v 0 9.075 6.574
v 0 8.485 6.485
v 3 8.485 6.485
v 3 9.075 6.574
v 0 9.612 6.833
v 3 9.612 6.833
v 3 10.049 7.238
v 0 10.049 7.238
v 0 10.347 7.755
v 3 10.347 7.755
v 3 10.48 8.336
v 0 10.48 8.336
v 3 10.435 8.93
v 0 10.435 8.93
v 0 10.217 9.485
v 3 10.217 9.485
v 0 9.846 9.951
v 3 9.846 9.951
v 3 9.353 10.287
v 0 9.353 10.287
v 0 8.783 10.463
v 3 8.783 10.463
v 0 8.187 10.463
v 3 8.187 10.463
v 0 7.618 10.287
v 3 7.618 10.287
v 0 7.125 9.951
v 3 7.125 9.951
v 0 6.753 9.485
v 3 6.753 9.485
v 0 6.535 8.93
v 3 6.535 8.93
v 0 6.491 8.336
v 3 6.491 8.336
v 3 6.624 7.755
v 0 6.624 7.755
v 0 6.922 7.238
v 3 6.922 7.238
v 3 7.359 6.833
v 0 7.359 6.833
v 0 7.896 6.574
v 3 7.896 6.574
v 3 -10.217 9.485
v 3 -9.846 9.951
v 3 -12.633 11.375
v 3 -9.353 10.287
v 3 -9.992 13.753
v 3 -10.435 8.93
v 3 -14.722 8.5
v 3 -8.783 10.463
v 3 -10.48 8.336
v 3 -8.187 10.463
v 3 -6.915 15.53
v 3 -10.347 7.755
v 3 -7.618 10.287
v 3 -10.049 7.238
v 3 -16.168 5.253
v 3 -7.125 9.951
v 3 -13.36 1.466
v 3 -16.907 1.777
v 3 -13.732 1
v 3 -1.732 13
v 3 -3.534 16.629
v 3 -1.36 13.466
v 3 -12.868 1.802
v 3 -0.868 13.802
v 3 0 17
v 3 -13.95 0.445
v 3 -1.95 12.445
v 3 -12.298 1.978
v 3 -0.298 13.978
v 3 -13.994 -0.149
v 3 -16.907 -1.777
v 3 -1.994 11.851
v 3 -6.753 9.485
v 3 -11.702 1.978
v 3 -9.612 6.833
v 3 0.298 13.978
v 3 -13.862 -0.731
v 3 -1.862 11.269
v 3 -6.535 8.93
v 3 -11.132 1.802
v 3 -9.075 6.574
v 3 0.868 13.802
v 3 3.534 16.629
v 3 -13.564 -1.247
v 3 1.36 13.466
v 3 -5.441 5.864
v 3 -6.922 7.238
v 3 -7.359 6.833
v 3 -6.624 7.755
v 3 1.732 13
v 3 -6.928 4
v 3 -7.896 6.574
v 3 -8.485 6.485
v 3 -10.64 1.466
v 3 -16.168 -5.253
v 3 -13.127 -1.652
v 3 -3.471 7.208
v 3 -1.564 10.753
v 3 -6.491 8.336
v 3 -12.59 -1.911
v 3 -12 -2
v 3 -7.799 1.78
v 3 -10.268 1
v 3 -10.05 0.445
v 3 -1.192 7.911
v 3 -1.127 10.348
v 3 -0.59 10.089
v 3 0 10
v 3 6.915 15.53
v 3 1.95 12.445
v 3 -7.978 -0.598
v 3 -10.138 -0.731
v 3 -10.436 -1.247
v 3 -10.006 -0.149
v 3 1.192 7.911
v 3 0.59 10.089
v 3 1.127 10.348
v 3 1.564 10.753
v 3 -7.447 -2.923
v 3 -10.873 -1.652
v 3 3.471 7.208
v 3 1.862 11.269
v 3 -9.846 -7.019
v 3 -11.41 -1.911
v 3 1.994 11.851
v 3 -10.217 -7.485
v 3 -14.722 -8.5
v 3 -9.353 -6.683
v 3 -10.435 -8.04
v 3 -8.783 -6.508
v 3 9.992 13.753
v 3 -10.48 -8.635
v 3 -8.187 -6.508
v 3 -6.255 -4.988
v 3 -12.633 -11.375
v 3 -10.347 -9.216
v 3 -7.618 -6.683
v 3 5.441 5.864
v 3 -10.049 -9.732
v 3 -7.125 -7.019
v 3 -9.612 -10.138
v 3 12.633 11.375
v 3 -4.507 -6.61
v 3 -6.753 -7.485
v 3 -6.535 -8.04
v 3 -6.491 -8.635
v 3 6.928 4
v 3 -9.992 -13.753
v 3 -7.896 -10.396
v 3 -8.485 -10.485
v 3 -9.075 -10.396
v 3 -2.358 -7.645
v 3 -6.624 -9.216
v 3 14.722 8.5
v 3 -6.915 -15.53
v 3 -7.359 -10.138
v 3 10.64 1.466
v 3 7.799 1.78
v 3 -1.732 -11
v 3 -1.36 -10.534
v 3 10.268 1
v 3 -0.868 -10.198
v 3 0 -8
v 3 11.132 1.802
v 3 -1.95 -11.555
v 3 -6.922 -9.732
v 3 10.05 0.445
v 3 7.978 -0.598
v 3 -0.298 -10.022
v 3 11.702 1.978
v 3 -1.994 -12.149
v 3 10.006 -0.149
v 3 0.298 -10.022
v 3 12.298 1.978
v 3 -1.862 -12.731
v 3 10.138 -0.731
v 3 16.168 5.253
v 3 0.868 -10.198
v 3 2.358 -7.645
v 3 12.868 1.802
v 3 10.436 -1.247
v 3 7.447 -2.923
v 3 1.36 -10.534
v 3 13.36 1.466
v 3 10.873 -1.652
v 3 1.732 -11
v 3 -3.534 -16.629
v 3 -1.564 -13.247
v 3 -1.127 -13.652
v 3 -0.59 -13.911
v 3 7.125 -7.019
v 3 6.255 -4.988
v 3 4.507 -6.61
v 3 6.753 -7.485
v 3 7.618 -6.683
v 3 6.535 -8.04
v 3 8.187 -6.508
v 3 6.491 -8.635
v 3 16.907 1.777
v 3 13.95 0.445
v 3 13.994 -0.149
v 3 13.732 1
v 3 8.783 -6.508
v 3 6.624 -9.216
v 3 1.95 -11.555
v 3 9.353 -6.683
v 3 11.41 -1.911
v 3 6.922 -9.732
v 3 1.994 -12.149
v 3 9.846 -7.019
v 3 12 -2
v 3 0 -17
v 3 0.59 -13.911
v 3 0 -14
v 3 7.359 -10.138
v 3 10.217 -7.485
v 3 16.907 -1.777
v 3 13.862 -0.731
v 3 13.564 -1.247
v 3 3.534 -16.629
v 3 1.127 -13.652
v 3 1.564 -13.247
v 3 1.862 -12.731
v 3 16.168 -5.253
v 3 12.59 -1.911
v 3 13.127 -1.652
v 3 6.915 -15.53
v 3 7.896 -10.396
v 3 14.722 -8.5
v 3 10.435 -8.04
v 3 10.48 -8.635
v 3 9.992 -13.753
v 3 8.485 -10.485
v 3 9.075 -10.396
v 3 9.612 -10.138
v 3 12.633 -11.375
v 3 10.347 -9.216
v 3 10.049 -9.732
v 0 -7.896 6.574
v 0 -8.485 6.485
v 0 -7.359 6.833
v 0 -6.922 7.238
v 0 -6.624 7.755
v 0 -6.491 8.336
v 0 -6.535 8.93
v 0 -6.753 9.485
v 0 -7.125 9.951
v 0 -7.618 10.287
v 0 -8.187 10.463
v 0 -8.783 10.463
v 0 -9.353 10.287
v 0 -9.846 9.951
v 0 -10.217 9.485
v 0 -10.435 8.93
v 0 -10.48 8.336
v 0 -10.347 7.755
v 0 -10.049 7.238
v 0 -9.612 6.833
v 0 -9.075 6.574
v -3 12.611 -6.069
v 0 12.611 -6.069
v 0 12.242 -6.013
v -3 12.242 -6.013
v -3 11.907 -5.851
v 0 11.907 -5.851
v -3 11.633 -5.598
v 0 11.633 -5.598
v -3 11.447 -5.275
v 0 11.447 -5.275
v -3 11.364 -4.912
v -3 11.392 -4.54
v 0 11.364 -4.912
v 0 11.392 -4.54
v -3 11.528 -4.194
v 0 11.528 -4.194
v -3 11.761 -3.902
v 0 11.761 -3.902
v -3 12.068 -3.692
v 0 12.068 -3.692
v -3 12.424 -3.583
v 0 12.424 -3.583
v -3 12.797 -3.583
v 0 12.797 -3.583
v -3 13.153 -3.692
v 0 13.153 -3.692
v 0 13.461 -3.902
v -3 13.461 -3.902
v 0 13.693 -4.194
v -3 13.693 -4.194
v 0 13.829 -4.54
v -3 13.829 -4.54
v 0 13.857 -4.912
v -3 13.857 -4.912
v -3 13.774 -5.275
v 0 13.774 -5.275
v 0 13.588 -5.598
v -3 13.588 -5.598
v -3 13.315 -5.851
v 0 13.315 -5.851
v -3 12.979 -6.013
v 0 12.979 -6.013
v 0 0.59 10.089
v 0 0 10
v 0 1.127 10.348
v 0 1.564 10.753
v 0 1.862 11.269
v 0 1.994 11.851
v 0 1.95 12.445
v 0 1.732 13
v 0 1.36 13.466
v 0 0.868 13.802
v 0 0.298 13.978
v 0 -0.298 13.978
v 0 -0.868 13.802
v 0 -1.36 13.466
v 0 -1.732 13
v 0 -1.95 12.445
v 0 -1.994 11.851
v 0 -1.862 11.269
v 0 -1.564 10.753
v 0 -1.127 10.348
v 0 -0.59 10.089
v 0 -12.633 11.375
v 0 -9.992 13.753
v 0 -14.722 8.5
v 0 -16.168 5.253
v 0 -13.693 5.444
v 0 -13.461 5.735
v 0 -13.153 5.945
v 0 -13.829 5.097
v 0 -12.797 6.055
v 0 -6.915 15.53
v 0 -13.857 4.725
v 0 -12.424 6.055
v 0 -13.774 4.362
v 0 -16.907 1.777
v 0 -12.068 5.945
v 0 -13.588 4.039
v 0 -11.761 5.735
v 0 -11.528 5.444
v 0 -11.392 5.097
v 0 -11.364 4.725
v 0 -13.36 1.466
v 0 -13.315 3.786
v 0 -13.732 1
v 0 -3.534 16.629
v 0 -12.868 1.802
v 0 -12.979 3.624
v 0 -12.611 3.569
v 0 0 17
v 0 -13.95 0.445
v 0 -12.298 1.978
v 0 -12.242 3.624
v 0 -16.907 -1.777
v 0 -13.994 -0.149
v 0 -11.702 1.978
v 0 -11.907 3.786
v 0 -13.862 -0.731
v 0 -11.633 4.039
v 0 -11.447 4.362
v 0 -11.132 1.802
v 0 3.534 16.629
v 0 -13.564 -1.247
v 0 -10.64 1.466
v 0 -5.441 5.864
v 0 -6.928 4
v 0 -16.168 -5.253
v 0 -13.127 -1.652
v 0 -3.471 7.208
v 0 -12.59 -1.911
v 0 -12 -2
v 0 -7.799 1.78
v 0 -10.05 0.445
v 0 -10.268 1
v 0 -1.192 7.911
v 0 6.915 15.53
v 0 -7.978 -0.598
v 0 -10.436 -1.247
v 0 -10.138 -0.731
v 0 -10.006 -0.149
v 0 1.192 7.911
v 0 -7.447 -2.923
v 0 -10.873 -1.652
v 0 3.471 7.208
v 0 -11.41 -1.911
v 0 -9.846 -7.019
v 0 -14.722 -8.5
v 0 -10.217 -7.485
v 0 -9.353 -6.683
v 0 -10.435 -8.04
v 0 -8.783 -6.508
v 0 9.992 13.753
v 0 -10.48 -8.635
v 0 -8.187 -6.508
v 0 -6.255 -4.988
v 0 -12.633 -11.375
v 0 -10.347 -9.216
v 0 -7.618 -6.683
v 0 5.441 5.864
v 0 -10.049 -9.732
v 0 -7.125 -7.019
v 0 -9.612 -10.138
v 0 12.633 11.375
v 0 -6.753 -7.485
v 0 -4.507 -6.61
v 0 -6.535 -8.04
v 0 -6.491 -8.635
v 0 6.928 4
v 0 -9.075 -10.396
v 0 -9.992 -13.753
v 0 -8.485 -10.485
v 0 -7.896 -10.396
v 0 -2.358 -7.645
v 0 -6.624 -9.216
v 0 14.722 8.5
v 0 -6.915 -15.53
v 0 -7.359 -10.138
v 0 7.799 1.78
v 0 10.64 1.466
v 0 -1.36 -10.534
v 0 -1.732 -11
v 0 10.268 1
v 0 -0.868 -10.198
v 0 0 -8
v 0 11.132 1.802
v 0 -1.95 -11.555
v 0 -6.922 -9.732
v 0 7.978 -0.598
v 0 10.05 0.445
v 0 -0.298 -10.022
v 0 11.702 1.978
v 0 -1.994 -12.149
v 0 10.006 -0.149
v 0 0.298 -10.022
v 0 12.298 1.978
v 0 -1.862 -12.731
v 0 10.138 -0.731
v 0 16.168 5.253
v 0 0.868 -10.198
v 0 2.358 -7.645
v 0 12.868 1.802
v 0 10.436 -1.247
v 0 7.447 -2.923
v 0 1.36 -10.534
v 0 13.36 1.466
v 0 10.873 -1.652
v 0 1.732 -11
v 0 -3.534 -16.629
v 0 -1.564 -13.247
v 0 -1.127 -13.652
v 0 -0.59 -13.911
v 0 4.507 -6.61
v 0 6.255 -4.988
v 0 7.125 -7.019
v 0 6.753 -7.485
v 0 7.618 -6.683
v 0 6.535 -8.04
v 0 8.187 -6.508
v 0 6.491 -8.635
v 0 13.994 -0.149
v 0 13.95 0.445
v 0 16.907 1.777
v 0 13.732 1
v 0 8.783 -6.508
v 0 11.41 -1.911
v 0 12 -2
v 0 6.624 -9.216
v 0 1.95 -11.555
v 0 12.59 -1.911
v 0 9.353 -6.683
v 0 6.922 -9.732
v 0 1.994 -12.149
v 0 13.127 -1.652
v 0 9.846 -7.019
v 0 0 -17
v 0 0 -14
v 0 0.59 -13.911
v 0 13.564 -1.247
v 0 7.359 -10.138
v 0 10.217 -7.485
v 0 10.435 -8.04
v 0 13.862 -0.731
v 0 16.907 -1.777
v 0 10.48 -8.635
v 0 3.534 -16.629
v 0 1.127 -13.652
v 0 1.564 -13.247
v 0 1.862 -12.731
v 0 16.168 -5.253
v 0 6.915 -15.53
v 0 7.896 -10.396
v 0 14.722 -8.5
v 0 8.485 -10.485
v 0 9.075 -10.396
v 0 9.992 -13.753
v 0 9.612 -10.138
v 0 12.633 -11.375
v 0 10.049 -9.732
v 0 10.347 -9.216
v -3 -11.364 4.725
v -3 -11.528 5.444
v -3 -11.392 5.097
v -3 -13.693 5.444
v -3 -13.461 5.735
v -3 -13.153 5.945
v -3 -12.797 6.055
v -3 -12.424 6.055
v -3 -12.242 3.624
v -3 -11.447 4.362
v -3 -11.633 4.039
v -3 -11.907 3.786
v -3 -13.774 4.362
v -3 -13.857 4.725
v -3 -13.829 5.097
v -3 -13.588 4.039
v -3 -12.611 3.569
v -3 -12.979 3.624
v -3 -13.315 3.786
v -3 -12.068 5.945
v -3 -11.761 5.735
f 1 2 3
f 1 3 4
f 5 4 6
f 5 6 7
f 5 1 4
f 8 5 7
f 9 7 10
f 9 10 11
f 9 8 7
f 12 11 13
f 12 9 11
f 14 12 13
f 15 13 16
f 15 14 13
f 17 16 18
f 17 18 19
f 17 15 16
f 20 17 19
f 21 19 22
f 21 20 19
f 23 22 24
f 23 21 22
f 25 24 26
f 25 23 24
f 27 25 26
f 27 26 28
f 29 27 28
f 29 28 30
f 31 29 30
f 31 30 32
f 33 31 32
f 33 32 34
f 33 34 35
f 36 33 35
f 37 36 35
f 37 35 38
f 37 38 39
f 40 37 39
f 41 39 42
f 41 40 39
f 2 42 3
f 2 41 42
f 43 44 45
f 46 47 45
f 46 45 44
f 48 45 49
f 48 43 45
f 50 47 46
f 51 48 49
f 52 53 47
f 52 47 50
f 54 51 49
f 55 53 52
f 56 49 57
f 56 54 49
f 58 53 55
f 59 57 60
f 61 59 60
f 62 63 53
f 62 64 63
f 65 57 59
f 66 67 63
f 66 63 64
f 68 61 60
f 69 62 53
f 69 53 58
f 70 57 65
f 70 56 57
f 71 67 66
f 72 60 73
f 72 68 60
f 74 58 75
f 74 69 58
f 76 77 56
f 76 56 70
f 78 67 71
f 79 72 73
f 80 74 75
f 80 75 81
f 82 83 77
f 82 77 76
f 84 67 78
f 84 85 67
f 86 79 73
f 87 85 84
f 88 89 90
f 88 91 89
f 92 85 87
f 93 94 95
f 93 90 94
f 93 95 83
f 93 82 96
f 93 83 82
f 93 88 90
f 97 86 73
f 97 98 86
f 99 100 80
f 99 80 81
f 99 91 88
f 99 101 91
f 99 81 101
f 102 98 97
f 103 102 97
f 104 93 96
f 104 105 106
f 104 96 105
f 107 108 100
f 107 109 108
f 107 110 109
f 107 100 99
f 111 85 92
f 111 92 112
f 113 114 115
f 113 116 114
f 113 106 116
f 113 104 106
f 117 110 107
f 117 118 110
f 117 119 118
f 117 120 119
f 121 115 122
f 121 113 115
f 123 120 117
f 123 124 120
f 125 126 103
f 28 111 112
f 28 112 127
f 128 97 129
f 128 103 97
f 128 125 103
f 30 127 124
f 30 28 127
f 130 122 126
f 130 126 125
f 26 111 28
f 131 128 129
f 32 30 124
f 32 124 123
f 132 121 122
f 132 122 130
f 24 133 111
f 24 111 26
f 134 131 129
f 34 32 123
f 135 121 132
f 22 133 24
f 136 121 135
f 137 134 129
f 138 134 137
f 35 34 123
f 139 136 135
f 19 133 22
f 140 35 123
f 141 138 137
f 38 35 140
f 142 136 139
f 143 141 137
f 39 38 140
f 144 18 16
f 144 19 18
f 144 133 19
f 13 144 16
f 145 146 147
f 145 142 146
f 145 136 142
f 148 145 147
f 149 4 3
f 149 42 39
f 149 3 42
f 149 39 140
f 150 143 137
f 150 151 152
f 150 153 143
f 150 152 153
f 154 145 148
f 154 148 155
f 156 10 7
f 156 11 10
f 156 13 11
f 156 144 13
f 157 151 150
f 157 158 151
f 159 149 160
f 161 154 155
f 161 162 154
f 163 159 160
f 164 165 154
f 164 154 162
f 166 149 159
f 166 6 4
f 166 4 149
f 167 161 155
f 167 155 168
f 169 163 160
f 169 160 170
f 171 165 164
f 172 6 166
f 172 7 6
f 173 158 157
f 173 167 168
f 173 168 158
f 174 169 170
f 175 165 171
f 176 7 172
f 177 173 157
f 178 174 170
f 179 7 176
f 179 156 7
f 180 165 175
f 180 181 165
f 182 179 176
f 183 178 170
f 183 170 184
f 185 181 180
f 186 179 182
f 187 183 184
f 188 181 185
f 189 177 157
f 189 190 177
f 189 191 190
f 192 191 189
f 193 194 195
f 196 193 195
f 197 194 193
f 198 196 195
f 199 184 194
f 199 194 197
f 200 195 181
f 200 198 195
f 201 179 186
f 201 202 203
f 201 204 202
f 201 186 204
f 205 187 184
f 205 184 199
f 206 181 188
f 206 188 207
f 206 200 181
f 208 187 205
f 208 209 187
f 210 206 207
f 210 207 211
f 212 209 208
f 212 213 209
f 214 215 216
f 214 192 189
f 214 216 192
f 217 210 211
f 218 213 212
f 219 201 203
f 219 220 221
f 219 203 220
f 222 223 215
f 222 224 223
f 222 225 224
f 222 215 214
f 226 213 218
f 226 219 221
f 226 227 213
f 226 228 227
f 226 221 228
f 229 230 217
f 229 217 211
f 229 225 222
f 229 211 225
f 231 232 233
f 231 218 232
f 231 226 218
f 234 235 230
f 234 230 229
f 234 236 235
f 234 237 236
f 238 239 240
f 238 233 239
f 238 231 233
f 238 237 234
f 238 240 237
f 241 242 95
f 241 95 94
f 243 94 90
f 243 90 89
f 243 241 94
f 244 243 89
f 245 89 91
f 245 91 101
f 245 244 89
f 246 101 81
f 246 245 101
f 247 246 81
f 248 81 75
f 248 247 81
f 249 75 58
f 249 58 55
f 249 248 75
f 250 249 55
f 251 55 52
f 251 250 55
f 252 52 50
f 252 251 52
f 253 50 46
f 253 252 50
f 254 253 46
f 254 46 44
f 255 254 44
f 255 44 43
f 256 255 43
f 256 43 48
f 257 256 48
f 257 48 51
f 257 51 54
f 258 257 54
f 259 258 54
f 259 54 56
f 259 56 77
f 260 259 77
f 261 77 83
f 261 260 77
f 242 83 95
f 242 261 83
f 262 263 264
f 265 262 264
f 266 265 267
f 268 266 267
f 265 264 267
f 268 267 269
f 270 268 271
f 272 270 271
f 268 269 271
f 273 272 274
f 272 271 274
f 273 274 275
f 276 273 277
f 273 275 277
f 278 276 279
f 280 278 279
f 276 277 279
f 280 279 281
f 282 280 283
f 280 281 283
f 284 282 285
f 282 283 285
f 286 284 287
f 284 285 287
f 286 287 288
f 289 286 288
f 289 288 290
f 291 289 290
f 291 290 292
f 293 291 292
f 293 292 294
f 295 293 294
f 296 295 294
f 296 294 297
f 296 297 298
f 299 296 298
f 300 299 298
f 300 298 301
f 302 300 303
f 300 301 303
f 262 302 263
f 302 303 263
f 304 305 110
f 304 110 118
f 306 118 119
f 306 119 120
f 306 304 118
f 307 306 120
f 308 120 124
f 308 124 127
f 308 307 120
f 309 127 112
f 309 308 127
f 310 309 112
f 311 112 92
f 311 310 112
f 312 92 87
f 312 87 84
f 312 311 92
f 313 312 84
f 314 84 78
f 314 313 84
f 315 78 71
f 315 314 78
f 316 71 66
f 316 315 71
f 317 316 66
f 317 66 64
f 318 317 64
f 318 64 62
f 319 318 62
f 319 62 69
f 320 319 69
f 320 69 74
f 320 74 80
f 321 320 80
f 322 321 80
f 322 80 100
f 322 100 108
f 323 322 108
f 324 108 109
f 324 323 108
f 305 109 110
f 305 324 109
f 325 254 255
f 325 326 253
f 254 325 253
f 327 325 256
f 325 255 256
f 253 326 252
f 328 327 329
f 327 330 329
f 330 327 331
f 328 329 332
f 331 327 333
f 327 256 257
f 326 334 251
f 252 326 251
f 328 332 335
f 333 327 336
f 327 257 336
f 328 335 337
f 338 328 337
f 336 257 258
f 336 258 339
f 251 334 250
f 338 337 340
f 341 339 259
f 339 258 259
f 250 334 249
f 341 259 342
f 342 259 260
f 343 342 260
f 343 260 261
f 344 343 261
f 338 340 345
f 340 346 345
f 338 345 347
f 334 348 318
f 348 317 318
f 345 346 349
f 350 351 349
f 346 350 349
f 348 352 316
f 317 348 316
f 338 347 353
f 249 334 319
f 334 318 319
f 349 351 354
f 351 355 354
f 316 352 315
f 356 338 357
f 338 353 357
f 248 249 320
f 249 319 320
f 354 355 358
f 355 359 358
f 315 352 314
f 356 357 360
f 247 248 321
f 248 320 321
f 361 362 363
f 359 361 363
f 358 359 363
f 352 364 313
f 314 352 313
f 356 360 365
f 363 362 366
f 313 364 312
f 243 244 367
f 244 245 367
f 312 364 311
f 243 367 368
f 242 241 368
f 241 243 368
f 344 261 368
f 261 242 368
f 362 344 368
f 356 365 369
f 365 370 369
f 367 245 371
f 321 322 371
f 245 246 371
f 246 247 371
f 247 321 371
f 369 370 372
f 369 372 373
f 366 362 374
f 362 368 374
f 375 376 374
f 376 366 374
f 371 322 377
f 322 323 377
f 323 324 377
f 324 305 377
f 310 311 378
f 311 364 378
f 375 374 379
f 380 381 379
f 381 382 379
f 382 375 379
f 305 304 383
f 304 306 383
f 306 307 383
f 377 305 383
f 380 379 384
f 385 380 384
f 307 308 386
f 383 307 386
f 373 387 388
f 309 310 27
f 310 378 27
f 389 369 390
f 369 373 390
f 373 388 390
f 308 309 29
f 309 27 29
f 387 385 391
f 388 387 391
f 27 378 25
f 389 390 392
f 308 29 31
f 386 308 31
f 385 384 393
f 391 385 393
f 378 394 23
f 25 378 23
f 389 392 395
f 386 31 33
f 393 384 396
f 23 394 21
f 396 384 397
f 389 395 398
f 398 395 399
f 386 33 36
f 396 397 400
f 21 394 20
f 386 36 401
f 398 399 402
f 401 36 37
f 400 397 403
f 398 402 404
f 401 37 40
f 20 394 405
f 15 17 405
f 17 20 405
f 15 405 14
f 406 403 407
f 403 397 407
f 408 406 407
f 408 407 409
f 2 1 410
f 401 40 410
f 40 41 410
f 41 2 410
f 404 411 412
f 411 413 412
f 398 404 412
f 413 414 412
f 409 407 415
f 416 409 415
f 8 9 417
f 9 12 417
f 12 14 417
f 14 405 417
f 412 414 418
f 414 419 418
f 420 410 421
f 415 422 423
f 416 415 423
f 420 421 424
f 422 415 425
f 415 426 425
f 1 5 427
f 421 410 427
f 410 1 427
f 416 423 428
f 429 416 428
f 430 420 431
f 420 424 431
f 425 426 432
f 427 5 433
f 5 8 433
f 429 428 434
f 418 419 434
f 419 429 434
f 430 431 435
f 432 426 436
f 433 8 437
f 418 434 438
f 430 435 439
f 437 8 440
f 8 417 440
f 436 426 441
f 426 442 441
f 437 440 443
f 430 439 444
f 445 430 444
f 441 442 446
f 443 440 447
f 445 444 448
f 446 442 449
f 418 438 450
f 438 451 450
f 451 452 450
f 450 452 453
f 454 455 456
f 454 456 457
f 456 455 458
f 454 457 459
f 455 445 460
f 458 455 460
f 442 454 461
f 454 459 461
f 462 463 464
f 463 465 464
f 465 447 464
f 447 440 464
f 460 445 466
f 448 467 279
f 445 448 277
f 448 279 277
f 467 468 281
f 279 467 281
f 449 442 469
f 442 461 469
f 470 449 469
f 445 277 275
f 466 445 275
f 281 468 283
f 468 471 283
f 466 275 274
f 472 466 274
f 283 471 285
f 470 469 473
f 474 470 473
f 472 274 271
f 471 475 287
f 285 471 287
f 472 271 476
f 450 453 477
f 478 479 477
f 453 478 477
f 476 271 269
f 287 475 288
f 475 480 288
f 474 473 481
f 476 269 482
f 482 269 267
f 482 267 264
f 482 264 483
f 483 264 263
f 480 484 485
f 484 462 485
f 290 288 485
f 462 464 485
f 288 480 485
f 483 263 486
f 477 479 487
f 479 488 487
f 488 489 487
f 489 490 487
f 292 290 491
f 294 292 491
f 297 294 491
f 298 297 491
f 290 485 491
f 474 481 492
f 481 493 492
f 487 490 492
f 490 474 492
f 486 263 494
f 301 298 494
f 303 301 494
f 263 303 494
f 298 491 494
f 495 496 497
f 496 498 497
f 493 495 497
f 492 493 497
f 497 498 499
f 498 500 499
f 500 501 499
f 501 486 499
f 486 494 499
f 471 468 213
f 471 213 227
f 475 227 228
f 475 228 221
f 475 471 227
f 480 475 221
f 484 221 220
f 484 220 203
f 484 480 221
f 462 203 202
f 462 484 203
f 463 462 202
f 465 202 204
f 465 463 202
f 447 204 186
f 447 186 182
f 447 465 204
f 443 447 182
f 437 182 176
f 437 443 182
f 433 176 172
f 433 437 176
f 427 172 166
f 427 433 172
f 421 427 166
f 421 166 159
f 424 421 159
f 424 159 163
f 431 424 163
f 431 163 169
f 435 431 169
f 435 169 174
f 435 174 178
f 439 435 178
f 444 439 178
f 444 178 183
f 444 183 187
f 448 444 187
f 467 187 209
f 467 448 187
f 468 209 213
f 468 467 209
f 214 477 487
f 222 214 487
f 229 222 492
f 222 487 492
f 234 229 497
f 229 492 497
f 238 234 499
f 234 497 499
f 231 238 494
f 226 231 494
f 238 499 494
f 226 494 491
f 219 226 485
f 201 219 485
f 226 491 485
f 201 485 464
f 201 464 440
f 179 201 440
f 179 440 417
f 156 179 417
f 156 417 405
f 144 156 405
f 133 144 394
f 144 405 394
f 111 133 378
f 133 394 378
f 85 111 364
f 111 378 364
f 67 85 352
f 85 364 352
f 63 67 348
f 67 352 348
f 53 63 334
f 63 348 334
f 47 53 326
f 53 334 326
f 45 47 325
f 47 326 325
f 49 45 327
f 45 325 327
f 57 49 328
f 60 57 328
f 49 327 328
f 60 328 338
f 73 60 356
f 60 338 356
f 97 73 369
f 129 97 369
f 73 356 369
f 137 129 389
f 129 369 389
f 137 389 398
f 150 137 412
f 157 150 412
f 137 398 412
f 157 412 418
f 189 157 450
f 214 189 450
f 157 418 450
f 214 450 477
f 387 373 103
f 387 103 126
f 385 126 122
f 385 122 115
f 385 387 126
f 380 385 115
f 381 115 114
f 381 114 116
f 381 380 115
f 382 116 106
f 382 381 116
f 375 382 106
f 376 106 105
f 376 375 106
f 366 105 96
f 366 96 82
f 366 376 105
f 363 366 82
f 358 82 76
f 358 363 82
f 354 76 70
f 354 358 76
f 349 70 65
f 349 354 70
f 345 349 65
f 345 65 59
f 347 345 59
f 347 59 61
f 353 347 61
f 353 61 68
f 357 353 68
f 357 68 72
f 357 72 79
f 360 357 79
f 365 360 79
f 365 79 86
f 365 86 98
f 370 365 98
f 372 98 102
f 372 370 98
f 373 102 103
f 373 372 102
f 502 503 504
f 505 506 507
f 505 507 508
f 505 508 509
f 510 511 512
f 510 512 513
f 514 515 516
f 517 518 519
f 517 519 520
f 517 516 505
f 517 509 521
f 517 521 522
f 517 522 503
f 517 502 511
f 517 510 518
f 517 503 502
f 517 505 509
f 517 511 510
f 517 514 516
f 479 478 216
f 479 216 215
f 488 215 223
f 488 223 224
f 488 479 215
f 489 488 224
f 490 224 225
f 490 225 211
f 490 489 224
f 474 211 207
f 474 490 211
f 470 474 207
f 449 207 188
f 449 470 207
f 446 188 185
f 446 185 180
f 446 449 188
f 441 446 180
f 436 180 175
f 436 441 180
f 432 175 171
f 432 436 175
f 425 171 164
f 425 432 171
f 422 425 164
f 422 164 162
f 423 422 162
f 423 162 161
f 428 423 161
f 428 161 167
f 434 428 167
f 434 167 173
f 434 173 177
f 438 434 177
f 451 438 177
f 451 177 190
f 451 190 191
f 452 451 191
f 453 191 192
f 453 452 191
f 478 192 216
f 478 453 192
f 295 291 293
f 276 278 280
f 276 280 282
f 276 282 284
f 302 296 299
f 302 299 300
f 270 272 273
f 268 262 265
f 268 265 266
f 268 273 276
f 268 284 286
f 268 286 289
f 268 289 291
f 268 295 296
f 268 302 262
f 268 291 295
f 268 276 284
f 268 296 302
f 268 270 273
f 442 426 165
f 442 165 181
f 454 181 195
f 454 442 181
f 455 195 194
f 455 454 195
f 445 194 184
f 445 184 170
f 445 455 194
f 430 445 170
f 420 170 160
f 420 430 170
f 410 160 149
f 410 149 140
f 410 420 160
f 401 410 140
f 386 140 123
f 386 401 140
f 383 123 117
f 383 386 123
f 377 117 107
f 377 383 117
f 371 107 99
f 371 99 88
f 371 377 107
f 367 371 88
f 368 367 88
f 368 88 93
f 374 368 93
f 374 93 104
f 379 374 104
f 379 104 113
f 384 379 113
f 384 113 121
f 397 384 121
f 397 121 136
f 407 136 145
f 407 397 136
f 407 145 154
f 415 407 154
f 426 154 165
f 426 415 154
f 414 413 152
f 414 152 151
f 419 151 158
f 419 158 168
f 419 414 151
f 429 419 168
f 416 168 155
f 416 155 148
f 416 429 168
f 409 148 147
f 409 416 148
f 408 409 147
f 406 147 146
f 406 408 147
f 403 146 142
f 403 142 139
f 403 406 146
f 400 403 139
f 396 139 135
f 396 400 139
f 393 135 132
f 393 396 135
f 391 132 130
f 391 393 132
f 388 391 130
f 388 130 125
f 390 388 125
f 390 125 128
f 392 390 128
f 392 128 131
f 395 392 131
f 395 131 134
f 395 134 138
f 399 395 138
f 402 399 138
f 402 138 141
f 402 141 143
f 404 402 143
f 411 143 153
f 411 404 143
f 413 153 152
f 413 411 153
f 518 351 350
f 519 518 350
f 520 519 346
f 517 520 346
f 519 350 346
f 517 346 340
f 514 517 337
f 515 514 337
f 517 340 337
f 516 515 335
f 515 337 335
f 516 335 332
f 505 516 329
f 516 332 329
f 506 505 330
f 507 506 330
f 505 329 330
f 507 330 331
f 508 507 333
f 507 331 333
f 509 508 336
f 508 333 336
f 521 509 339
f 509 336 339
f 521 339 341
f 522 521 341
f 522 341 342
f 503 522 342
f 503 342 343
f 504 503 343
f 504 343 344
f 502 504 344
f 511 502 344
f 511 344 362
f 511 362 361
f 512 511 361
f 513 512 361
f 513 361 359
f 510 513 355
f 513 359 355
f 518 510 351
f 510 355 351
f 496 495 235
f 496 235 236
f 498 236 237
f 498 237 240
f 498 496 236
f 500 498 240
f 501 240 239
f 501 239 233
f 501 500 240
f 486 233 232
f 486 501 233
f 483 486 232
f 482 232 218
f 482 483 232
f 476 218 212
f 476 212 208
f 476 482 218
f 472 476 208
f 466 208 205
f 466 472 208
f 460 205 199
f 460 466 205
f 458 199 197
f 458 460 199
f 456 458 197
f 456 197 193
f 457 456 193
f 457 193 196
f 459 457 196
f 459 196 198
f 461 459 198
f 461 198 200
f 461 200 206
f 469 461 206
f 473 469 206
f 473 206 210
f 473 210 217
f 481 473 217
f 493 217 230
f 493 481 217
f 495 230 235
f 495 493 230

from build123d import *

# Parameters (mm, degrees)
SKETCH1_R           = 17
SKETCH1_R_2         = 2
SKETCH1_R_3         = 8
BOSS_EXTRUDE1_DEPTH = 3
SKETCH2_R           = 1.25
BOSS_EXTRUDE2_DEPTH = 3


with BuildPart() as part:
    # Sketch1 → Boss-Extrude1 (new body)
    with BuildSketch(Plane(origin=(0, 0, 0), x_dir=(0, 0, -1), z_dir=(1, 0, 0))):
        Circle(SKETCH1_R)
        with Locations((0, 12)):
            Circle(SKETCH1_R_2, mode=Mode.SUBTRACT)
        with Locations((8.485281374, 8.485281374)):
            Circle(SKETCH1_R_2, mode=Mode.SUBTRACT)
        with Locations((12, 0)):
            Circle(SKETCH1_R_2, mode=Mode.SUBTRACT)
        with Locations((8.485281374, -8.485281374)):
            Circle(SKETCH1_R_2, mode=Mode.SUBTRACT)
        with Locations((0, -12)):
            Circle(SKETCH1_R_2, mode=Mode.SUBTRACT)
        with Locations((-8.485281374, -8.485281374)):
            Circle(SKETCH1_R_2, mode=Mode.SUBTRACT)
        with Locations((-12, 0)):
            Circle(SKETCH1_R_2, mode=Mode.SUBTRACT)
        with Locations((-8.485281374, 8.485281374)):
            Circle(SKETCH1_R_2, mode=Mode.SUBTRACT)
        Circle(SKETCH1_R_3, mode=Mode.SUBTRACT)
    extrude(amount=BOSS_EXTRUDE1_DEPTH)

    # Sketch2 → Boss-Extrude2 (add)
    with BuildSketch(Plane.ZY):
        with Locations(Location((-4.818635741, 12.610739455, 0), (0, 0, 180))):
            Circle(SKETCH2_R)
        with Locations(Location((4.818635741, -12.610739455, 0), (0, 0, 180))):
            Circle(SKETCH2_R)
    extrude(amount=BOSS_EXTRUDE2_DEPTH)


solid = part.part
